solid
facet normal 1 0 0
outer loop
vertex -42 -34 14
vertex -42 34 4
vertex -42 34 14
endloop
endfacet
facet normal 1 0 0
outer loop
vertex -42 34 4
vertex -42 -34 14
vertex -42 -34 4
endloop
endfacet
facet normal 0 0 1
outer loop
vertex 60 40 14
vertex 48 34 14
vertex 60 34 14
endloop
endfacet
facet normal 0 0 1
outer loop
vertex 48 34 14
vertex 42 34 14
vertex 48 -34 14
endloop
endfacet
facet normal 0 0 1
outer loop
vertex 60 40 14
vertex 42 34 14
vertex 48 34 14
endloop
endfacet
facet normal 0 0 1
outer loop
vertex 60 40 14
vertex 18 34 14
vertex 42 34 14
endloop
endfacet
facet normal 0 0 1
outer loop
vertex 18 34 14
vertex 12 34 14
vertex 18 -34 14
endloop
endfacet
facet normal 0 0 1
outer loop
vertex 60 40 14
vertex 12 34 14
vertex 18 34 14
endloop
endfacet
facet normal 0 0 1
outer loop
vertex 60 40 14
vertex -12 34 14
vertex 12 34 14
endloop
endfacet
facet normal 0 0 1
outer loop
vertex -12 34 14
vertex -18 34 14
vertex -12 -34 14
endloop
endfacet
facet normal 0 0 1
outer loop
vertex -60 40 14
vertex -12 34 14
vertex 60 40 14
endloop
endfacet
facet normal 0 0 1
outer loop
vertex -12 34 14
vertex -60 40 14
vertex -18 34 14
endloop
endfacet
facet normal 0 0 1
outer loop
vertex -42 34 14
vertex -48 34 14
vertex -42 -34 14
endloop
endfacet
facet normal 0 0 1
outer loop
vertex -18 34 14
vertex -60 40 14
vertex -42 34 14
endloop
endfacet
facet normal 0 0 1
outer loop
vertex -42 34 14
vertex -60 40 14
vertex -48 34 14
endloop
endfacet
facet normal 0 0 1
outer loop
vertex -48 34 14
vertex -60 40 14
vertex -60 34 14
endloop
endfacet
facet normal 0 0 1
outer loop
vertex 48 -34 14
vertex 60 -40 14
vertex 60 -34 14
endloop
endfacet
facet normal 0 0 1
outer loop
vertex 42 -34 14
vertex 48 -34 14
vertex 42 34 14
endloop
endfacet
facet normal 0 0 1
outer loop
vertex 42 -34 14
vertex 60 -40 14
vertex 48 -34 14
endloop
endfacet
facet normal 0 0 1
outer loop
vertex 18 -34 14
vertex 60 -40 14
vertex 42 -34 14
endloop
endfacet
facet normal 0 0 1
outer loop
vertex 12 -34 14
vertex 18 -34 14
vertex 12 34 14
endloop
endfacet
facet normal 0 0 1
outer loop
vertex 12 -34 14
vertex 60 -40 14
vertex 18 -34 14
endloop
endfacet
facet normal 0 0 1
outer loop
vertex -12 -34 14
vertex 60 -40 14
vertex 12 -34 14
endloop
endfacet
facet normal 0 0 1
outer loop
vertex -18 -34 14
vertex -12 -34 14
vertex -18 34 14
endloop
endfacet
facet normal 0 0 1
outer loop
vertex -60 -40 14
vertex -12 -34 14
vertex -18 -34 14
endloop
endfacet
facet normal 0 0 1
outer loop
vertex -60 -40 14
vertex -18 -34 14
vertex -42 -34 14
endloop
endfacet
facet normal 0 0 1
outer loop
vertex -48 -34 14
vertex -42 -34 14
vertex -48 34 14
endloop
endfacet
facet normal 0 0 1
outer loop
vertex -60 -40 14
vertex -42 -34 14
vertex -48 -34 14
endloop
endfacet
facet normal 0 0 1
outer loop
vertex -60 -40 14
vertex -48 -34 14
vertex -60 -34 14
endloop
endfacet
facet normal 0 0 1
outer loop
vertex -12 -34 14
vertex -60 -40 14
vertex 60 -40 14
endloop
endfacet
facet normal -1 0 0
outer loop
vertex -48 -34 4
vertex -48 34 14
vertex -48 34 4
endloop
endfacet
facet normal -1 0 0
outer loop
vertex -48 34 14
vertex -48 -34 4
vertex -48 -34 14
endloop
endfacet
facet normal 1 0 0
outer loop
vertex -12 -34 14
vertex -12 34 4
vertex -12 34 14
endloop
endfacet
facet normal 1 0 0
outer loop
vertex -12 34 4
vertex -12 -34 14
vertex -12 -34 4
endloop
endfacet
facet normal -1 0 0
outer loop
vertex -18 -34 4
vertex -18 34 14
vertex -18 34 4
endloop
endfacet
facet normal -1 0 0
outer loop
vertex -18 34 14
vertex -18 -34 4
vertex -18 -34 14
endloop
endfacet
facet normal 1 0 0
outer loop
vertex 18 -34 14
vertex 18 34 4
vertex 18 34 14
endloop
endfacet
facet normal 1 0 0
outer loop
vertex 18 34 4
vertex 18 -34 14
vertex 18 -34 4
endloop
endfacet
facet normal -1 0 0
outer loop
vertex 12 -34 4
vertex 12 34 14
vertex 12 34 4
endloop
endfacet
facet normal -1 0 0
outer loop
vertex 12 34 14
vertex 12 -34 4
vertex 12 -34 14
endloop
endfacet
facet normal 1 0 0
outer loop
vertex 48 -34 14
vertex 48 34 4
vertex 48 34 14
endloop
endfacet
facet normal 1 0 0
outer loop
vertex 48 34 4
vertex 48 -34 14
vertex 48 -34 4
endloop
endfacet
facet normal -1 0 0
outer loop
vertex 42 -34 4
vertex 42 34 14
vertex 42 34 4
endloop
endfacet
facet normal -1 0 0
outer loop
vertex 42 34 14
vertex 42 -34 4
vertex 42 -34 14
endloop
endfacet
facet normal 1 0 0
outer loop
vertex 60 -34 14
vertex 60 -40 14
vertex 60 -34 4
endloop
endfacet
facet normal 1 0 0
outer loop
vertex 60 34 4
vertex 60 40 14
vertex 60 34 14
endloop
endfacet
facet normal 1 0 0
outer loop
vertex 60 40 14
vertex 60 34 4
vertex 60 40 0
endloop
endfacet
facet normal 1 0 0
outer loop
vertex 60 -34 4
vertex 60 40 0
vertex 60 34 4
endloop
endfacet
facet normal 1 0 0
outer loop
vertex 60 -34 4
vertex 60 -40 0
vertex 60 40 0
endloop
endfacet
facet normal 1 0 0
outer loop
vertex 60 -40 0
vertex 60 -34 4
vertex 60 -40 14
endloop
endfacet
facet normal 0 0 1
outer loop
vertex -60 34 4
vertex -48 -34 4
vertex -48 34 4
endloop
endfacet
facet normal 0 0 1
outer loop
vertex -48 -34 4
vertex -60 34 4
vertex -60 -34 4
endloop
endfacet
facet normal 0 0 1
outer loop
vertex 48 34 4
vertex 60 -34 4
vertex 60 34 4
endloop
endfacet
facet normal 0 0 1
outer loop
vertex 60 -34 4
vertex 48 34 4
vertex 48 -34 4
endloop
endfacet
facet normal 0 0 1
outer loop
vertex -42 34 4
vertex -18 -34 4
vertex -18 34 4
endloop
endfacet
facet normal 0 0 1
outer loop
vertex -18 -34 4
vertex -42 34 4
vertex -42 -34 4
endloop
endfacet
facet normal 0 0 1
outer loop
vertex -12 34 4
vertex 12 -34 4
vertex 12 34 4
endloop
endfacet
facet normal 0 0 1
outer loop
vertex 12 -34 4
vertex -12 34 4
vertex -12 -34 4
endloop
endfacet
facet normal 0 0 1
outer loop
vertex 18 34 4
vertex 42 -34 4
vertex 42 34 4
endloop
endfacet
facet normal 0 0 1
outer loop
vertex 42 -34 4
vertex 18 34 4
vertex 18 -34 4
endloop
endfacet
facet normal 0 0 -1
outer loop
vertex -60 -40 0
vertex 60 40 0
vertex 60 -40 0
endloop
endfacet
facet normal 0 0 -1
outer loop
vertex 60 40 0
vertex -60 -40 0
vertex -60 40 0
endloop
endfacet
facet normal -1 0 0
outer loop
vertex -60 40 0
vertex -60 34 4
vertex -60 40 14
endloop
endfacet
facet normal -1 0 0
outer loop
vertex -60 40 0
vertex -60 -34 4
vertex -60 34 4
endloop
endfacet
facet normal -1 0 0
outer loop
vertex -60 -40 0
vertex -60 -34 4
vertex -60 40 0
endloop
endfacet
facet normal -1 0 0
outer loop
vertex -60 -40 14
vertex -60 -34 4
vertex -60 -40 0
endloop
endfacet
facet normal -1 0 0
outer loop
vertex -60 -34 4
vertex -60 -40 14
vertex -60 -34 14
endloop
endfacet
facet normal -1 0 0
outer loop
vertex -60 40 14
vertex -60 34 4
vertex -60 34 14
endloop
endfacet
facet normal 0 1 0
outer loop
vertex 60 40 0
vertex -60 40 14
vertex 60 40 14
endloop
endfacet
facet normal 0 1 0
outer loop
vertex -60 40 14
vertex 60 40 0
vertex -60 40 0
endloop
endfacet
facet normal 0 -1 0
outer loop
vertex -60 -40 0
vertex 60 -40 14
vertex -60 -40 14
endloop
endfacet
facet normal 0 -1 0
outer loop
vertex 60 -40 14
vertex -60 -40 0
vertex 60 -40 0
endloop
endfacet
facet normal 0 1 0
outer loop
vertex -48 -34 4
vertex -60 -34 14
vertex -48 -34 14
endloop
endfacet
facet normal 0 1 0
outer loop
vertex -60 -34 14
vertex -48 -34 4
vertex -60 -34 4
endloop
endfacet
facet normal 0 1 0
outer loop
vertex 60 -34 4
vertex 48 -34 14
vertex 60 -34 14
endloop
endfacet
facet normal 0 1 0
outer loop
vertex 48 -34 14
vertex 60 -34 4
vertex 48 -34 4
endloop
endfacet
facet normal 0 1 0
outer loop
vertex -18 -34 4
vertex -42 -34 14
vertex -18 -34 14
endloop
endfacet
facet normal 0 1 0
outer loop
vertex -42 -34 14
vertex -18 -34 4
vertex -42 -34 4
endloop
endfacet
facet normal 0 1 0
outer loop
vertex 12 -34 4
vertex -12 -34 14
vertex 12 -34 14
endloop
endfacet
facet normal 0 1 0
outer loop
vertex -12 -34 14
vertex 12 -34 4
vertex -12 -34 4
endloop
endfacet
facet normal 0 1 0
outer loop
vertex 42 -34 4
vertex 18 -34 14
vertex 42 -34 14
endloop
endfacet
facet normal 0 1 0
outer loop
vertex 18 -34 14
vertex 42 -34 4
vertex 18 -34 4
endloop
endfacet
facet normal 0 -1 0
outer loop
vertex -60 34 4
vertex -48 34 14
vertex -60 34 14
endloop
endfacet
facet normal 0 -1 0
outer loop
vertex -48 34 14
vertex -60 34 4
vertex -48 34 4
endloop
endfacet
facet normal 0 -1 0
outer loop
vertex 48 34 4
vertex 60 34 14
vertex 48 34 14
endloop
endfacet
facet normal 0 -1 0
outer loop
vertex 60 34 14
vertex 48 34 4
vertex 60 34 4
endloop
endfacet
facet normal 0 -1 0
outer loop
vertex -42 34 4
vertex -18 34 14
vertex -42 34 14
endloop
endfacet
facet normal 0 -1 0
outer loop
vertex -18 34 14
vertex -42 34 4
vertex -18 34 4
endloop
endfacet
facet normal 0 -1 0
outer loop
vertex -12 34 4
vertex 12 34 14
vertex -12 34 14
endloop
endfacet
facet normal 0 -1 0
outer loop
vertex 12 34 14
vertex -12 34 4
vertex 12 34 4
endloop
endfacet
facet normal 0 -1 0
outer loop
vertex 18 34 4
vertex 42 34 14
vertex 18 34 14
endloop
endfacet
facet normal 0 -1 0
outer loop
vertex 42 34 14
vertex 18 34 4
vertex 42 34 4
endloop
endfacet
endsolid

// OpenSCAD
$fn = 32;

// ----------------------------------------------------------------------
// Rib frame 120 x 80 x 14
// 4 ribs at 30 mm pitch
// ----------------------------------------------------------------------

// --- parameters (mm) ---
frame = [120, 80, 4];  // base plate size (x, y, z)
rail_w = 6;            // side rail width
ribs = 4;              // number of ribs
rib_t = 6;             // rib thickness
rib_h = 10;            // rib height above the base plate
pitch = 30;            // pitch between rib centres

// --- derived feature positions (mm) ---
span = (ribs - 1) * pitch;          // = 90   distance between the outer ribs
origin_x = -span / 2;               // = -45   X of the first rib
rib_len = frame[1] - 2 * rail_w + 2;  // = 70   rib length, 1 mm into each rail
feature_centers = [
  [origin_x + 0 * pitch, 0],
  [origin_x + 1 * pitch, 0],
  [origin_x + 2 * pitch, 0],
  [origin_x + 3 * pitch, 0]
];   // rib centre line, drives the rib loop

// base plate, two side rails, then the ribs read straight off feature_centers
union() {
  translate([-frame[0] / 2, -frame[1] / 2, 0]) cube(frame);
  translate([-frame[0] / 2, -frame[1] / 2, 0]) cube([frame[0], rail_w, frame[2] + rib_h]);
  translate([-frame[0] / 2, frame[1] / 2 - rail_w, 0]) cube([frame[0], rail_w, frame[2] + rib_h]);
  for (centre = feature_centers)
    translate([centre[0] - rib_t / 2, centre[1] - rib_len / 2, frame[2] - 1])
      cube([rib_t, rib_len, rib_h + 1]);
}
